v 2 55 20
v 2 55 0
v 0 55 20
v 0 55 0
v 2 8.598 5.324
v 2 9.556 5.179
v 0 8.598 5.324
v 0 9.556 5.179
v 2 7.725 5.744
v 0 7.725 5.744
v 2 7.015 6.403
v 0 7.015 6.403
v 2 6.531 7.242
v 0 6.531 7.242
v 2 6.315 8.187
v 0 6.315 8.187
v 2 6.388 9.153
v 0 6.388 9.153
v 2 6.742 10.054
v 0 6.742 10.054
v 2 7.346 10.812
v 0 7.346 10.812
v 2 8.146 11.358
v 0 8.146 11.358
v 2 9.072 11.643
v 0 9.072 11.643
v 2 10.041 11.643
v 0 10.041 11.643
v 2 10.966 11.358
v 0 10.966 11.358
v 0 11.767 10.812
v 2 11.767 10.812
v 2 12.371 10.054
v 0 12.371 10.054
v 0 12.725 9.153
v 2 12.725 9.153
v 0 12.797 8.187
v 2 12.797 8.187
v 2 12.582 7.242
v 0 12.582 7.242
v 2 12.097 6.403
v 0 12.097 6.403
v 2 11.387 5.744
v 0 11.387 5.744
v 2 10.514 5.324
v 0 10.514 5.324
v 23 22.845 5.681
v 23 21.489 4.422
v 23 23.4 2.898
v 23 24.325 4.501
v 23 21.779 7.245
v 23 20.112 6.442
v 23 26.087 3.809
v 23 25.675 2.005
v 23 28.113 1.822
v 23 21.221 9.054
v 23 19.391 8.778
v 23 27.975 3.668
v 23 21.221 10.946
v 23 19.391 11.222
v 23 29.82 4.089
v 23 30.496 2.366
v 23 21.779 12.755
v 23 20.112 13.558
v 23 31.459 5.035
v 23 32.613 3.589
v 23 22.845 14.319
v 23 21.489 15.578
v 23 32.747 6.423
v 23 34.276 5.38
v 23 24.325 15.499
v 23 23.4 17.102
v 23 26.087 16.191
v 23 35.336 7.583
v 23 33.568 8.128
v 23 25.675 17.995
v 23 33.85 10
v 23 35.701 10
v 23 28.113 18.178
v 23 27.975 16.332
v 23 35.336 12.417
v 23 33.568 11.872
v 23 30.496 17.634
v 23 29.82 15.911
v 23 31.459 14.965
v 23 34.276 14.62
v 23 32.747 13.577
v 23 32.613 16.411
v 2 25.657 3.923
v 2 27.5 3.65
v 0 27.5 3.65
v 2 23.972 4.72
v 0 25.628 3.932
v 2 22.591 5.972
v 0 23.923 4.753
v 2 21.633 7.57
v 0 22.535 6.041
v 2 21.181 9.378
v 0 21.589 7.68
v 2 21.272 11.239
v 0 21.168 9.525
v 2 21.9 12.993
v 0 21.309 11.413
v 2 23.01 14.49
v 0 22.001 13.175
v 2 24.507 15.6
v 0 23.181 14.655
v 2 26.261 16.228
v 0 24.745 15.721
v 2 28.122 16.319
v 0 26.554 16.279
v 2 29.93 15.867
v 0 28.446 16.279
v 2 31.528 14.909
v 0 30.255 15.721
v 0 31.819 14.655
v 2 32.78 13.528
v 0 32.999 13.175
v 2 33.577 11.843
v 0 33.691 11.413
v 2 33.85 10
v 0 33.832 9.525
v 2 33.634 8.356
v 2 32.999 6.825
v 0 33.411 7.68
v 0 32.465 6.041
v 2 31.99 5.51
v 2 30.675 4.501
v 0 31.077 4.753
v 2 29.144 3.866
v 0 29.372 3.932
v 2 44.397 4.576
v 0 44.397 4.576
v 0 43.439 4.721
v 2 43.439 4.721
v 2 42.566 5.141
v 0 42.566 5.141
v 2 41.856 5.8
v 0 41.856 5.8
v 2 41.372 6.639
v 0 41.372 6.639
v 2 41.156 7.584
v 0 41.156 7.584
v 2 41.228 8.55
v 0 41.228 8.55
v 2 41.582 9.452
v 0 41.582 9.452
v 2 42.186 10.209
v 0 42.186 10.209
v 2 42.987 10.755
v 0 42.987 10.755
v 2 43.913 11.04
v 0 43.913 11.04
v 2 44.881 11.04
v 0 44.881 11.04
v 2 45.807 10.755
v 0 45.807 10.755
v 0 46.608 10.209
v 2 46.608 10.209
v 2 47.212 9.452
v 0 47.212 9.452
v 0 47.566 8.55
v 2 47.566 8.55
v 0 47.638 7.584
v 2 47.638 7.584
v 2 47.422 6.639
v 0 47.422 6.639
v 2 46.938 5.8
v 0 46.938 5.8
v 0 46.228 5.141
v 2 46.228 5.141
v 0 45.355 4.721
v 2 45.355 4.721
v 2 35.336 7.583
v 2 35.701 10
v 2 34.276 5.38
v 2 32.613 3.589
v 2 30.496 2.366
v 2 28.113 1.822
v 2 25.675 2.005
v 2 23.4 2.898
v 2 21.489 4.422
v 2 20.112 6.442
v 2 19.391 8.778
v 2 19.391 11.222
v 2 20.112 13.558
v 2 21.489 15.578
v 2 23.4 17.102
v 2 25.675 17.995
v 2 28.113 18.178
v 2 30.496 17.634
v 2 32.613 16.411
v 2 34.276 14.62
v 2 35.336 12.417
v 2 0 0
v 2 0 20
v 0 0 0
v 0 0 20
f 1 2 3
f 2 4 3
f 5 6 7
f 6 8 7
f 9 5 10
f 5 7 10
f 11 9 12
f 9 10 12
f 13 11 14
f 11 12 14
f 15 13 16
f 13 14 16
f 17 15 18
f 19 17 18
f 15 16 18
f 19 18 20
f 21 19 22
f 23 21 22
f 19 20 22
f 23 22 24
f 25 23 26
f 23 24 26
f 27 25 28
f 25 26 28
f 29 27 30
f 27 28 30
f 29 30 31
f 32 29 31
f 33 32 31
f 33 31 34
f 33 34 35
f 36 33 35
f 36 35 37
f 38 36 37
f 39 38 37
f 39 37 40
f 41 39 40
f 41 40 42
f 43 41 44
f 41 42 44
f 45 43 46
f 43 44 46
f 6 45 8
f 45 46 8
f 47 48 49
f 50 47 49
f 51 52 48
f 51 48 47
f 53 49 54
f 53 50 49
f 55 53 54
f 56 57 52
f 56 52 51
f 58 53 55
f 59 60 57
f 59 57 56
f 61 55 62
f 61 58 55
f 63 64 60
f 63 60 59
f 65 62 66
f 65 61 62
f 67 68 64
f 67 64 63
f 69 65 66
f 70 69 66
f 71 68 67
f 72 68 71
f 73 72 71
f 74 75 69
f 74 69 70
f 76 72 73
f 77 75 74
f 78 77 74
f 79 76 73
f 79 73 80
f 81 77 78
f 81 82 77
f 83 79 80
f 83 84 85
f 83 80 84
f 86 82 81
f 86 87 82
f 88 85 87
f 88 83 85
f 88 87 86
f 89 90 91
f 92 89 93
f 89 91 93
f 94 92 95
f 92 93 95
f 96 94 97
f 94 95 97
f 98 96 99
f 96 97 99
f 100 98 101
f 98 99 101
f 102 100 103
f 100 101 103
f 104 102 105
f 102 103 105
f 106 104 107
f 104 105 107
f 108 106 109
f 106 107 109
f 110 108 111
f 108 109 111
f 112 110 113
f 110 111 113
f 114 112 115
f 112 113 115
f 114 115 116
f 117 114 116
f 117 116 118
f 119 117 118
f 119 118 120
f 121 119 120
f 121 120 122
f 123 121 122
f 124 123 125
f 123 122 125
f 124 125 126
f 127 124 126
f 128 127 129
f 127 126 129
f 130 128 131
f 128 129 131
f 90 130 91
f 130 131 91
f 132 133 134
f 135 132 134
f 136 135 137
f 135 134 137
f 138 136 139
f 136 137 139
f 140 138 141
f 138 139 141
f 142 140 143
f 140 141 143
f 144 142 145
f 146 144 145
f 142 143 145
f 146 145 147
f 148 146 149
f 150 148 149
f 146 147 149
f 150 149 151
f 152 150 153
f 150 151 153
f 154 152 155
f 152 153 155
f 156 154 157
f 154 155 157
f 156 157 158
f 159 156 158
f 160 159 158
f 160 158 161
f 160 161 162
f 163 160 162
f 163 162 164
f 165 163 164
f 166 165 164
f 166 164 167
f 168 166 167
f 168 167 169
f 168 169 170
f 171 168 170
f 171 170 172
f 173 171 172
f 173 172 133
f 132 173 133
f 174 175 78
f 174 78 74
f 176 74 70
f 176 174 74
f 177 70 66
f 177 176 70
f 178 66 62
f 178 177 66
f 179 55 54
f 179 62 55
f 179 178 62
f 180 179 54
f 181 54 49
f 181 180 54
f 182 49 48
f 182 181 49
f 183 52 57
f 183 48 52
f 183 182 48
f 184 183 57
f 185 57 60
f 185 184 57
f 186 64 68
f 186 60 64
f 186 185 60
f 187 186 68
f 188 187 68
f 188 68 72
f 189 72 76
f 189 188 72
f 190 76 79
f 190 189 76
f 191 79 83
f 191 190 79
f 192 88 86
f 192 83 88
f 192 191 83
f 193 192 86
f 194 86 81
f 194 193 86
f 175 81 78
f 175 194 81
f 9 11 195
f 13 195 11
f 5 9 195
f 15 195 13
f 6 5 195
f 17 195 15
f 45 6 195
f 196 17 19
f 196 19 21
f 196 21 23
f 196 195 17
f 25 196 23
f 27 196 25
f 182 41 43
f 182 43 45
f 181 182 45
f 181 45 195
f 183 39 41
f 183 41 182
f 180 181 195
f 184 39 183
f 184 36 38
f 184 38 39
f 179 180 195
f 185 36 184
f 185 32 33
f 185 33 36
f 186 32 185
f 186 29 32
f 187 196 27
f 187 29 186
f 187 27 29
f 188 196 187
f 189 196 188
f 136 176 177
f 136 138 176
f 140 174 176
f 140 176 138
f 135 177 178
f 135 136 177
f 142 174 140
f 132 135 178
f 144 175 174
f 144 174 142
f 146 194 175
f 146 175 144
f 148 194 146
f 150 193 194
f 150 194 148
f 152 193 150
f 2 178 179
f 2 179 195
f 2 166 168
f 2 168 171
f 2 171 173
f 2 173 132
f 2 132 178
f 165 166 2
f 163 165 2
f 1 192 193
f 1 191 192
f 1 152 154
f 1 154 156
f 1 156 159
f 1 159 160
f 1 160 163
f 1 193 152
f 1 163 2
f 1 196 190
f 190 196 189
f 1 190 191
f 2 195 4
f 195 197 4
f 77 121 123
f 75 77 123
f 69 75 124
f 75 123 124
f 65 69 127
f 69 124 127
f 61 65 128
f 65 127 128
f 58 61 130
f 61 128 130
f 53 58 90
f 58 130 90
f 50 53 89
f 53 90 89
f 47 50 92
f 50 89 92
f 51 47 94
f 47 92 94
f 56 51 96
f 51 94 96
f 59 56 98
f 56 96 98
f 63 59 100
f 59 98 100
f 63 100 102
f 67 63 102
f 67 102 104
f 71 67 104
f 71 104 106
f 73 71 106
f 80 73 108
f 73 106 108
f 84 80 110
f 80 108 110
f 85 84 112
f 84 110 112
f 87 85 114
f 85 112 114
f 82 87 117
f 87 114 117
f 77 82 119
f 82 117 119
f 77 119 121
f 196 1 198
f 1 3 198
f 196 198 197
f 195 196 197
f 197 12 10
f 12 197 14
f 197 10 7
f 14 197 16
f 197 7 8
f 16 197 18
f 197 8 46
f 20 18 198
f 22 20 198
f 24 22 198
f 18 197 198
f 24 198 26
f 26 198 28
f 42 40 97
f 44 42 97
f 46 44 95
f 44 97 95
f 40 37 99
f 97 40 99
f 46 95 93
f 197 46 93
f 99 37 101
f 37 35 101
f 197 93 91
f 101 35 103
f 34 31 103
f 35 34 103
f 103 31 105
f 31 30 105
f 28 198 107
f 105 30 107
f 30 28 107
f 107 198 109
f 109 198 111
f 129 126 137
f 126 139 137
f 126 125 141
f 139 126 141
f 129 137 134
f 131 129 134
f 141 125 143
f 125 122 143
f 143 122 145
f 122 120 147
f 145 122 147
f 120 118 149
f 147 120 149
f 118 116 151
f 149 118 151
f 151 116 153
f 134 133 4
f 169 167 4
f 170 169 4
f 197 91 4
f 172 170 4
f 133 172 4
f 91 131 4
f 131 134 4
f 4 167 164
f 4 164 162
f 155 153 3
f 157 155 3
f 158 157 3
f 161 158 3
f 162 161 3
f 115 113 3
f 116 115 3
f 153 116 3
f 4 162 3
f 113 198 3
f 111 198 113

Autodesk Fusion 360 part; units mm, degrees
sketch "Sketch1" plane through (0, 0, 0) normal (1, 0, 0) x (0, 1, 0)
  line L0 (0, 0) -> (55, 0)
  line L1 (55, 0) -> (55, 20)
  line L2 (55, 20) -> (0, 20)
  line L3 (0, 20) -> (0, 0)
sketch "Sketch2" plane through (0, 0, 0) normal (1, 0, 0) x (0, 1, 0)
  circle A0 centre (27.5766, 10.2067) radius 6.35
  dimension "d1" = 12.7
extrude "Extrude1" add sketch "Sketch1" along normal blind 2
hole "Hole1" at (2, 27.5, 10) direction (-1, 0, 0) diameter 12.7 depth 8 tip angle 118
sketch "Sketch3" plane through (2, 0, 0) normal (1, 0, 0) x (0, 1, 0)
  circle A0 centre (27.5, 10) radius 6.35
  line L0 (0, 20) -> (0, 0)
  line L1 (0, 0) -> (55, 0)
  line L2 (55, 0) -> (55, 20)
  line L3 (55, 20) -> (0, 20)
  circle A1 centre (27.5, 10) radius 8.2006
  circle A2 centre (27.5, 10) radius 6.35
extrude "Extrude2" add sketch "Sketch3" along normal blind 21 contours A1
hole "Hole2" at (2, 9.5562, 8.4294) direction (-1, 0, 0) diameter 6.5 depth 8 tip angle 118
hole "Hole3" at (2, 44.397, 7.8265) direction (-1, 0, 0) diameter 6.5 depth 8 tip angle 118
